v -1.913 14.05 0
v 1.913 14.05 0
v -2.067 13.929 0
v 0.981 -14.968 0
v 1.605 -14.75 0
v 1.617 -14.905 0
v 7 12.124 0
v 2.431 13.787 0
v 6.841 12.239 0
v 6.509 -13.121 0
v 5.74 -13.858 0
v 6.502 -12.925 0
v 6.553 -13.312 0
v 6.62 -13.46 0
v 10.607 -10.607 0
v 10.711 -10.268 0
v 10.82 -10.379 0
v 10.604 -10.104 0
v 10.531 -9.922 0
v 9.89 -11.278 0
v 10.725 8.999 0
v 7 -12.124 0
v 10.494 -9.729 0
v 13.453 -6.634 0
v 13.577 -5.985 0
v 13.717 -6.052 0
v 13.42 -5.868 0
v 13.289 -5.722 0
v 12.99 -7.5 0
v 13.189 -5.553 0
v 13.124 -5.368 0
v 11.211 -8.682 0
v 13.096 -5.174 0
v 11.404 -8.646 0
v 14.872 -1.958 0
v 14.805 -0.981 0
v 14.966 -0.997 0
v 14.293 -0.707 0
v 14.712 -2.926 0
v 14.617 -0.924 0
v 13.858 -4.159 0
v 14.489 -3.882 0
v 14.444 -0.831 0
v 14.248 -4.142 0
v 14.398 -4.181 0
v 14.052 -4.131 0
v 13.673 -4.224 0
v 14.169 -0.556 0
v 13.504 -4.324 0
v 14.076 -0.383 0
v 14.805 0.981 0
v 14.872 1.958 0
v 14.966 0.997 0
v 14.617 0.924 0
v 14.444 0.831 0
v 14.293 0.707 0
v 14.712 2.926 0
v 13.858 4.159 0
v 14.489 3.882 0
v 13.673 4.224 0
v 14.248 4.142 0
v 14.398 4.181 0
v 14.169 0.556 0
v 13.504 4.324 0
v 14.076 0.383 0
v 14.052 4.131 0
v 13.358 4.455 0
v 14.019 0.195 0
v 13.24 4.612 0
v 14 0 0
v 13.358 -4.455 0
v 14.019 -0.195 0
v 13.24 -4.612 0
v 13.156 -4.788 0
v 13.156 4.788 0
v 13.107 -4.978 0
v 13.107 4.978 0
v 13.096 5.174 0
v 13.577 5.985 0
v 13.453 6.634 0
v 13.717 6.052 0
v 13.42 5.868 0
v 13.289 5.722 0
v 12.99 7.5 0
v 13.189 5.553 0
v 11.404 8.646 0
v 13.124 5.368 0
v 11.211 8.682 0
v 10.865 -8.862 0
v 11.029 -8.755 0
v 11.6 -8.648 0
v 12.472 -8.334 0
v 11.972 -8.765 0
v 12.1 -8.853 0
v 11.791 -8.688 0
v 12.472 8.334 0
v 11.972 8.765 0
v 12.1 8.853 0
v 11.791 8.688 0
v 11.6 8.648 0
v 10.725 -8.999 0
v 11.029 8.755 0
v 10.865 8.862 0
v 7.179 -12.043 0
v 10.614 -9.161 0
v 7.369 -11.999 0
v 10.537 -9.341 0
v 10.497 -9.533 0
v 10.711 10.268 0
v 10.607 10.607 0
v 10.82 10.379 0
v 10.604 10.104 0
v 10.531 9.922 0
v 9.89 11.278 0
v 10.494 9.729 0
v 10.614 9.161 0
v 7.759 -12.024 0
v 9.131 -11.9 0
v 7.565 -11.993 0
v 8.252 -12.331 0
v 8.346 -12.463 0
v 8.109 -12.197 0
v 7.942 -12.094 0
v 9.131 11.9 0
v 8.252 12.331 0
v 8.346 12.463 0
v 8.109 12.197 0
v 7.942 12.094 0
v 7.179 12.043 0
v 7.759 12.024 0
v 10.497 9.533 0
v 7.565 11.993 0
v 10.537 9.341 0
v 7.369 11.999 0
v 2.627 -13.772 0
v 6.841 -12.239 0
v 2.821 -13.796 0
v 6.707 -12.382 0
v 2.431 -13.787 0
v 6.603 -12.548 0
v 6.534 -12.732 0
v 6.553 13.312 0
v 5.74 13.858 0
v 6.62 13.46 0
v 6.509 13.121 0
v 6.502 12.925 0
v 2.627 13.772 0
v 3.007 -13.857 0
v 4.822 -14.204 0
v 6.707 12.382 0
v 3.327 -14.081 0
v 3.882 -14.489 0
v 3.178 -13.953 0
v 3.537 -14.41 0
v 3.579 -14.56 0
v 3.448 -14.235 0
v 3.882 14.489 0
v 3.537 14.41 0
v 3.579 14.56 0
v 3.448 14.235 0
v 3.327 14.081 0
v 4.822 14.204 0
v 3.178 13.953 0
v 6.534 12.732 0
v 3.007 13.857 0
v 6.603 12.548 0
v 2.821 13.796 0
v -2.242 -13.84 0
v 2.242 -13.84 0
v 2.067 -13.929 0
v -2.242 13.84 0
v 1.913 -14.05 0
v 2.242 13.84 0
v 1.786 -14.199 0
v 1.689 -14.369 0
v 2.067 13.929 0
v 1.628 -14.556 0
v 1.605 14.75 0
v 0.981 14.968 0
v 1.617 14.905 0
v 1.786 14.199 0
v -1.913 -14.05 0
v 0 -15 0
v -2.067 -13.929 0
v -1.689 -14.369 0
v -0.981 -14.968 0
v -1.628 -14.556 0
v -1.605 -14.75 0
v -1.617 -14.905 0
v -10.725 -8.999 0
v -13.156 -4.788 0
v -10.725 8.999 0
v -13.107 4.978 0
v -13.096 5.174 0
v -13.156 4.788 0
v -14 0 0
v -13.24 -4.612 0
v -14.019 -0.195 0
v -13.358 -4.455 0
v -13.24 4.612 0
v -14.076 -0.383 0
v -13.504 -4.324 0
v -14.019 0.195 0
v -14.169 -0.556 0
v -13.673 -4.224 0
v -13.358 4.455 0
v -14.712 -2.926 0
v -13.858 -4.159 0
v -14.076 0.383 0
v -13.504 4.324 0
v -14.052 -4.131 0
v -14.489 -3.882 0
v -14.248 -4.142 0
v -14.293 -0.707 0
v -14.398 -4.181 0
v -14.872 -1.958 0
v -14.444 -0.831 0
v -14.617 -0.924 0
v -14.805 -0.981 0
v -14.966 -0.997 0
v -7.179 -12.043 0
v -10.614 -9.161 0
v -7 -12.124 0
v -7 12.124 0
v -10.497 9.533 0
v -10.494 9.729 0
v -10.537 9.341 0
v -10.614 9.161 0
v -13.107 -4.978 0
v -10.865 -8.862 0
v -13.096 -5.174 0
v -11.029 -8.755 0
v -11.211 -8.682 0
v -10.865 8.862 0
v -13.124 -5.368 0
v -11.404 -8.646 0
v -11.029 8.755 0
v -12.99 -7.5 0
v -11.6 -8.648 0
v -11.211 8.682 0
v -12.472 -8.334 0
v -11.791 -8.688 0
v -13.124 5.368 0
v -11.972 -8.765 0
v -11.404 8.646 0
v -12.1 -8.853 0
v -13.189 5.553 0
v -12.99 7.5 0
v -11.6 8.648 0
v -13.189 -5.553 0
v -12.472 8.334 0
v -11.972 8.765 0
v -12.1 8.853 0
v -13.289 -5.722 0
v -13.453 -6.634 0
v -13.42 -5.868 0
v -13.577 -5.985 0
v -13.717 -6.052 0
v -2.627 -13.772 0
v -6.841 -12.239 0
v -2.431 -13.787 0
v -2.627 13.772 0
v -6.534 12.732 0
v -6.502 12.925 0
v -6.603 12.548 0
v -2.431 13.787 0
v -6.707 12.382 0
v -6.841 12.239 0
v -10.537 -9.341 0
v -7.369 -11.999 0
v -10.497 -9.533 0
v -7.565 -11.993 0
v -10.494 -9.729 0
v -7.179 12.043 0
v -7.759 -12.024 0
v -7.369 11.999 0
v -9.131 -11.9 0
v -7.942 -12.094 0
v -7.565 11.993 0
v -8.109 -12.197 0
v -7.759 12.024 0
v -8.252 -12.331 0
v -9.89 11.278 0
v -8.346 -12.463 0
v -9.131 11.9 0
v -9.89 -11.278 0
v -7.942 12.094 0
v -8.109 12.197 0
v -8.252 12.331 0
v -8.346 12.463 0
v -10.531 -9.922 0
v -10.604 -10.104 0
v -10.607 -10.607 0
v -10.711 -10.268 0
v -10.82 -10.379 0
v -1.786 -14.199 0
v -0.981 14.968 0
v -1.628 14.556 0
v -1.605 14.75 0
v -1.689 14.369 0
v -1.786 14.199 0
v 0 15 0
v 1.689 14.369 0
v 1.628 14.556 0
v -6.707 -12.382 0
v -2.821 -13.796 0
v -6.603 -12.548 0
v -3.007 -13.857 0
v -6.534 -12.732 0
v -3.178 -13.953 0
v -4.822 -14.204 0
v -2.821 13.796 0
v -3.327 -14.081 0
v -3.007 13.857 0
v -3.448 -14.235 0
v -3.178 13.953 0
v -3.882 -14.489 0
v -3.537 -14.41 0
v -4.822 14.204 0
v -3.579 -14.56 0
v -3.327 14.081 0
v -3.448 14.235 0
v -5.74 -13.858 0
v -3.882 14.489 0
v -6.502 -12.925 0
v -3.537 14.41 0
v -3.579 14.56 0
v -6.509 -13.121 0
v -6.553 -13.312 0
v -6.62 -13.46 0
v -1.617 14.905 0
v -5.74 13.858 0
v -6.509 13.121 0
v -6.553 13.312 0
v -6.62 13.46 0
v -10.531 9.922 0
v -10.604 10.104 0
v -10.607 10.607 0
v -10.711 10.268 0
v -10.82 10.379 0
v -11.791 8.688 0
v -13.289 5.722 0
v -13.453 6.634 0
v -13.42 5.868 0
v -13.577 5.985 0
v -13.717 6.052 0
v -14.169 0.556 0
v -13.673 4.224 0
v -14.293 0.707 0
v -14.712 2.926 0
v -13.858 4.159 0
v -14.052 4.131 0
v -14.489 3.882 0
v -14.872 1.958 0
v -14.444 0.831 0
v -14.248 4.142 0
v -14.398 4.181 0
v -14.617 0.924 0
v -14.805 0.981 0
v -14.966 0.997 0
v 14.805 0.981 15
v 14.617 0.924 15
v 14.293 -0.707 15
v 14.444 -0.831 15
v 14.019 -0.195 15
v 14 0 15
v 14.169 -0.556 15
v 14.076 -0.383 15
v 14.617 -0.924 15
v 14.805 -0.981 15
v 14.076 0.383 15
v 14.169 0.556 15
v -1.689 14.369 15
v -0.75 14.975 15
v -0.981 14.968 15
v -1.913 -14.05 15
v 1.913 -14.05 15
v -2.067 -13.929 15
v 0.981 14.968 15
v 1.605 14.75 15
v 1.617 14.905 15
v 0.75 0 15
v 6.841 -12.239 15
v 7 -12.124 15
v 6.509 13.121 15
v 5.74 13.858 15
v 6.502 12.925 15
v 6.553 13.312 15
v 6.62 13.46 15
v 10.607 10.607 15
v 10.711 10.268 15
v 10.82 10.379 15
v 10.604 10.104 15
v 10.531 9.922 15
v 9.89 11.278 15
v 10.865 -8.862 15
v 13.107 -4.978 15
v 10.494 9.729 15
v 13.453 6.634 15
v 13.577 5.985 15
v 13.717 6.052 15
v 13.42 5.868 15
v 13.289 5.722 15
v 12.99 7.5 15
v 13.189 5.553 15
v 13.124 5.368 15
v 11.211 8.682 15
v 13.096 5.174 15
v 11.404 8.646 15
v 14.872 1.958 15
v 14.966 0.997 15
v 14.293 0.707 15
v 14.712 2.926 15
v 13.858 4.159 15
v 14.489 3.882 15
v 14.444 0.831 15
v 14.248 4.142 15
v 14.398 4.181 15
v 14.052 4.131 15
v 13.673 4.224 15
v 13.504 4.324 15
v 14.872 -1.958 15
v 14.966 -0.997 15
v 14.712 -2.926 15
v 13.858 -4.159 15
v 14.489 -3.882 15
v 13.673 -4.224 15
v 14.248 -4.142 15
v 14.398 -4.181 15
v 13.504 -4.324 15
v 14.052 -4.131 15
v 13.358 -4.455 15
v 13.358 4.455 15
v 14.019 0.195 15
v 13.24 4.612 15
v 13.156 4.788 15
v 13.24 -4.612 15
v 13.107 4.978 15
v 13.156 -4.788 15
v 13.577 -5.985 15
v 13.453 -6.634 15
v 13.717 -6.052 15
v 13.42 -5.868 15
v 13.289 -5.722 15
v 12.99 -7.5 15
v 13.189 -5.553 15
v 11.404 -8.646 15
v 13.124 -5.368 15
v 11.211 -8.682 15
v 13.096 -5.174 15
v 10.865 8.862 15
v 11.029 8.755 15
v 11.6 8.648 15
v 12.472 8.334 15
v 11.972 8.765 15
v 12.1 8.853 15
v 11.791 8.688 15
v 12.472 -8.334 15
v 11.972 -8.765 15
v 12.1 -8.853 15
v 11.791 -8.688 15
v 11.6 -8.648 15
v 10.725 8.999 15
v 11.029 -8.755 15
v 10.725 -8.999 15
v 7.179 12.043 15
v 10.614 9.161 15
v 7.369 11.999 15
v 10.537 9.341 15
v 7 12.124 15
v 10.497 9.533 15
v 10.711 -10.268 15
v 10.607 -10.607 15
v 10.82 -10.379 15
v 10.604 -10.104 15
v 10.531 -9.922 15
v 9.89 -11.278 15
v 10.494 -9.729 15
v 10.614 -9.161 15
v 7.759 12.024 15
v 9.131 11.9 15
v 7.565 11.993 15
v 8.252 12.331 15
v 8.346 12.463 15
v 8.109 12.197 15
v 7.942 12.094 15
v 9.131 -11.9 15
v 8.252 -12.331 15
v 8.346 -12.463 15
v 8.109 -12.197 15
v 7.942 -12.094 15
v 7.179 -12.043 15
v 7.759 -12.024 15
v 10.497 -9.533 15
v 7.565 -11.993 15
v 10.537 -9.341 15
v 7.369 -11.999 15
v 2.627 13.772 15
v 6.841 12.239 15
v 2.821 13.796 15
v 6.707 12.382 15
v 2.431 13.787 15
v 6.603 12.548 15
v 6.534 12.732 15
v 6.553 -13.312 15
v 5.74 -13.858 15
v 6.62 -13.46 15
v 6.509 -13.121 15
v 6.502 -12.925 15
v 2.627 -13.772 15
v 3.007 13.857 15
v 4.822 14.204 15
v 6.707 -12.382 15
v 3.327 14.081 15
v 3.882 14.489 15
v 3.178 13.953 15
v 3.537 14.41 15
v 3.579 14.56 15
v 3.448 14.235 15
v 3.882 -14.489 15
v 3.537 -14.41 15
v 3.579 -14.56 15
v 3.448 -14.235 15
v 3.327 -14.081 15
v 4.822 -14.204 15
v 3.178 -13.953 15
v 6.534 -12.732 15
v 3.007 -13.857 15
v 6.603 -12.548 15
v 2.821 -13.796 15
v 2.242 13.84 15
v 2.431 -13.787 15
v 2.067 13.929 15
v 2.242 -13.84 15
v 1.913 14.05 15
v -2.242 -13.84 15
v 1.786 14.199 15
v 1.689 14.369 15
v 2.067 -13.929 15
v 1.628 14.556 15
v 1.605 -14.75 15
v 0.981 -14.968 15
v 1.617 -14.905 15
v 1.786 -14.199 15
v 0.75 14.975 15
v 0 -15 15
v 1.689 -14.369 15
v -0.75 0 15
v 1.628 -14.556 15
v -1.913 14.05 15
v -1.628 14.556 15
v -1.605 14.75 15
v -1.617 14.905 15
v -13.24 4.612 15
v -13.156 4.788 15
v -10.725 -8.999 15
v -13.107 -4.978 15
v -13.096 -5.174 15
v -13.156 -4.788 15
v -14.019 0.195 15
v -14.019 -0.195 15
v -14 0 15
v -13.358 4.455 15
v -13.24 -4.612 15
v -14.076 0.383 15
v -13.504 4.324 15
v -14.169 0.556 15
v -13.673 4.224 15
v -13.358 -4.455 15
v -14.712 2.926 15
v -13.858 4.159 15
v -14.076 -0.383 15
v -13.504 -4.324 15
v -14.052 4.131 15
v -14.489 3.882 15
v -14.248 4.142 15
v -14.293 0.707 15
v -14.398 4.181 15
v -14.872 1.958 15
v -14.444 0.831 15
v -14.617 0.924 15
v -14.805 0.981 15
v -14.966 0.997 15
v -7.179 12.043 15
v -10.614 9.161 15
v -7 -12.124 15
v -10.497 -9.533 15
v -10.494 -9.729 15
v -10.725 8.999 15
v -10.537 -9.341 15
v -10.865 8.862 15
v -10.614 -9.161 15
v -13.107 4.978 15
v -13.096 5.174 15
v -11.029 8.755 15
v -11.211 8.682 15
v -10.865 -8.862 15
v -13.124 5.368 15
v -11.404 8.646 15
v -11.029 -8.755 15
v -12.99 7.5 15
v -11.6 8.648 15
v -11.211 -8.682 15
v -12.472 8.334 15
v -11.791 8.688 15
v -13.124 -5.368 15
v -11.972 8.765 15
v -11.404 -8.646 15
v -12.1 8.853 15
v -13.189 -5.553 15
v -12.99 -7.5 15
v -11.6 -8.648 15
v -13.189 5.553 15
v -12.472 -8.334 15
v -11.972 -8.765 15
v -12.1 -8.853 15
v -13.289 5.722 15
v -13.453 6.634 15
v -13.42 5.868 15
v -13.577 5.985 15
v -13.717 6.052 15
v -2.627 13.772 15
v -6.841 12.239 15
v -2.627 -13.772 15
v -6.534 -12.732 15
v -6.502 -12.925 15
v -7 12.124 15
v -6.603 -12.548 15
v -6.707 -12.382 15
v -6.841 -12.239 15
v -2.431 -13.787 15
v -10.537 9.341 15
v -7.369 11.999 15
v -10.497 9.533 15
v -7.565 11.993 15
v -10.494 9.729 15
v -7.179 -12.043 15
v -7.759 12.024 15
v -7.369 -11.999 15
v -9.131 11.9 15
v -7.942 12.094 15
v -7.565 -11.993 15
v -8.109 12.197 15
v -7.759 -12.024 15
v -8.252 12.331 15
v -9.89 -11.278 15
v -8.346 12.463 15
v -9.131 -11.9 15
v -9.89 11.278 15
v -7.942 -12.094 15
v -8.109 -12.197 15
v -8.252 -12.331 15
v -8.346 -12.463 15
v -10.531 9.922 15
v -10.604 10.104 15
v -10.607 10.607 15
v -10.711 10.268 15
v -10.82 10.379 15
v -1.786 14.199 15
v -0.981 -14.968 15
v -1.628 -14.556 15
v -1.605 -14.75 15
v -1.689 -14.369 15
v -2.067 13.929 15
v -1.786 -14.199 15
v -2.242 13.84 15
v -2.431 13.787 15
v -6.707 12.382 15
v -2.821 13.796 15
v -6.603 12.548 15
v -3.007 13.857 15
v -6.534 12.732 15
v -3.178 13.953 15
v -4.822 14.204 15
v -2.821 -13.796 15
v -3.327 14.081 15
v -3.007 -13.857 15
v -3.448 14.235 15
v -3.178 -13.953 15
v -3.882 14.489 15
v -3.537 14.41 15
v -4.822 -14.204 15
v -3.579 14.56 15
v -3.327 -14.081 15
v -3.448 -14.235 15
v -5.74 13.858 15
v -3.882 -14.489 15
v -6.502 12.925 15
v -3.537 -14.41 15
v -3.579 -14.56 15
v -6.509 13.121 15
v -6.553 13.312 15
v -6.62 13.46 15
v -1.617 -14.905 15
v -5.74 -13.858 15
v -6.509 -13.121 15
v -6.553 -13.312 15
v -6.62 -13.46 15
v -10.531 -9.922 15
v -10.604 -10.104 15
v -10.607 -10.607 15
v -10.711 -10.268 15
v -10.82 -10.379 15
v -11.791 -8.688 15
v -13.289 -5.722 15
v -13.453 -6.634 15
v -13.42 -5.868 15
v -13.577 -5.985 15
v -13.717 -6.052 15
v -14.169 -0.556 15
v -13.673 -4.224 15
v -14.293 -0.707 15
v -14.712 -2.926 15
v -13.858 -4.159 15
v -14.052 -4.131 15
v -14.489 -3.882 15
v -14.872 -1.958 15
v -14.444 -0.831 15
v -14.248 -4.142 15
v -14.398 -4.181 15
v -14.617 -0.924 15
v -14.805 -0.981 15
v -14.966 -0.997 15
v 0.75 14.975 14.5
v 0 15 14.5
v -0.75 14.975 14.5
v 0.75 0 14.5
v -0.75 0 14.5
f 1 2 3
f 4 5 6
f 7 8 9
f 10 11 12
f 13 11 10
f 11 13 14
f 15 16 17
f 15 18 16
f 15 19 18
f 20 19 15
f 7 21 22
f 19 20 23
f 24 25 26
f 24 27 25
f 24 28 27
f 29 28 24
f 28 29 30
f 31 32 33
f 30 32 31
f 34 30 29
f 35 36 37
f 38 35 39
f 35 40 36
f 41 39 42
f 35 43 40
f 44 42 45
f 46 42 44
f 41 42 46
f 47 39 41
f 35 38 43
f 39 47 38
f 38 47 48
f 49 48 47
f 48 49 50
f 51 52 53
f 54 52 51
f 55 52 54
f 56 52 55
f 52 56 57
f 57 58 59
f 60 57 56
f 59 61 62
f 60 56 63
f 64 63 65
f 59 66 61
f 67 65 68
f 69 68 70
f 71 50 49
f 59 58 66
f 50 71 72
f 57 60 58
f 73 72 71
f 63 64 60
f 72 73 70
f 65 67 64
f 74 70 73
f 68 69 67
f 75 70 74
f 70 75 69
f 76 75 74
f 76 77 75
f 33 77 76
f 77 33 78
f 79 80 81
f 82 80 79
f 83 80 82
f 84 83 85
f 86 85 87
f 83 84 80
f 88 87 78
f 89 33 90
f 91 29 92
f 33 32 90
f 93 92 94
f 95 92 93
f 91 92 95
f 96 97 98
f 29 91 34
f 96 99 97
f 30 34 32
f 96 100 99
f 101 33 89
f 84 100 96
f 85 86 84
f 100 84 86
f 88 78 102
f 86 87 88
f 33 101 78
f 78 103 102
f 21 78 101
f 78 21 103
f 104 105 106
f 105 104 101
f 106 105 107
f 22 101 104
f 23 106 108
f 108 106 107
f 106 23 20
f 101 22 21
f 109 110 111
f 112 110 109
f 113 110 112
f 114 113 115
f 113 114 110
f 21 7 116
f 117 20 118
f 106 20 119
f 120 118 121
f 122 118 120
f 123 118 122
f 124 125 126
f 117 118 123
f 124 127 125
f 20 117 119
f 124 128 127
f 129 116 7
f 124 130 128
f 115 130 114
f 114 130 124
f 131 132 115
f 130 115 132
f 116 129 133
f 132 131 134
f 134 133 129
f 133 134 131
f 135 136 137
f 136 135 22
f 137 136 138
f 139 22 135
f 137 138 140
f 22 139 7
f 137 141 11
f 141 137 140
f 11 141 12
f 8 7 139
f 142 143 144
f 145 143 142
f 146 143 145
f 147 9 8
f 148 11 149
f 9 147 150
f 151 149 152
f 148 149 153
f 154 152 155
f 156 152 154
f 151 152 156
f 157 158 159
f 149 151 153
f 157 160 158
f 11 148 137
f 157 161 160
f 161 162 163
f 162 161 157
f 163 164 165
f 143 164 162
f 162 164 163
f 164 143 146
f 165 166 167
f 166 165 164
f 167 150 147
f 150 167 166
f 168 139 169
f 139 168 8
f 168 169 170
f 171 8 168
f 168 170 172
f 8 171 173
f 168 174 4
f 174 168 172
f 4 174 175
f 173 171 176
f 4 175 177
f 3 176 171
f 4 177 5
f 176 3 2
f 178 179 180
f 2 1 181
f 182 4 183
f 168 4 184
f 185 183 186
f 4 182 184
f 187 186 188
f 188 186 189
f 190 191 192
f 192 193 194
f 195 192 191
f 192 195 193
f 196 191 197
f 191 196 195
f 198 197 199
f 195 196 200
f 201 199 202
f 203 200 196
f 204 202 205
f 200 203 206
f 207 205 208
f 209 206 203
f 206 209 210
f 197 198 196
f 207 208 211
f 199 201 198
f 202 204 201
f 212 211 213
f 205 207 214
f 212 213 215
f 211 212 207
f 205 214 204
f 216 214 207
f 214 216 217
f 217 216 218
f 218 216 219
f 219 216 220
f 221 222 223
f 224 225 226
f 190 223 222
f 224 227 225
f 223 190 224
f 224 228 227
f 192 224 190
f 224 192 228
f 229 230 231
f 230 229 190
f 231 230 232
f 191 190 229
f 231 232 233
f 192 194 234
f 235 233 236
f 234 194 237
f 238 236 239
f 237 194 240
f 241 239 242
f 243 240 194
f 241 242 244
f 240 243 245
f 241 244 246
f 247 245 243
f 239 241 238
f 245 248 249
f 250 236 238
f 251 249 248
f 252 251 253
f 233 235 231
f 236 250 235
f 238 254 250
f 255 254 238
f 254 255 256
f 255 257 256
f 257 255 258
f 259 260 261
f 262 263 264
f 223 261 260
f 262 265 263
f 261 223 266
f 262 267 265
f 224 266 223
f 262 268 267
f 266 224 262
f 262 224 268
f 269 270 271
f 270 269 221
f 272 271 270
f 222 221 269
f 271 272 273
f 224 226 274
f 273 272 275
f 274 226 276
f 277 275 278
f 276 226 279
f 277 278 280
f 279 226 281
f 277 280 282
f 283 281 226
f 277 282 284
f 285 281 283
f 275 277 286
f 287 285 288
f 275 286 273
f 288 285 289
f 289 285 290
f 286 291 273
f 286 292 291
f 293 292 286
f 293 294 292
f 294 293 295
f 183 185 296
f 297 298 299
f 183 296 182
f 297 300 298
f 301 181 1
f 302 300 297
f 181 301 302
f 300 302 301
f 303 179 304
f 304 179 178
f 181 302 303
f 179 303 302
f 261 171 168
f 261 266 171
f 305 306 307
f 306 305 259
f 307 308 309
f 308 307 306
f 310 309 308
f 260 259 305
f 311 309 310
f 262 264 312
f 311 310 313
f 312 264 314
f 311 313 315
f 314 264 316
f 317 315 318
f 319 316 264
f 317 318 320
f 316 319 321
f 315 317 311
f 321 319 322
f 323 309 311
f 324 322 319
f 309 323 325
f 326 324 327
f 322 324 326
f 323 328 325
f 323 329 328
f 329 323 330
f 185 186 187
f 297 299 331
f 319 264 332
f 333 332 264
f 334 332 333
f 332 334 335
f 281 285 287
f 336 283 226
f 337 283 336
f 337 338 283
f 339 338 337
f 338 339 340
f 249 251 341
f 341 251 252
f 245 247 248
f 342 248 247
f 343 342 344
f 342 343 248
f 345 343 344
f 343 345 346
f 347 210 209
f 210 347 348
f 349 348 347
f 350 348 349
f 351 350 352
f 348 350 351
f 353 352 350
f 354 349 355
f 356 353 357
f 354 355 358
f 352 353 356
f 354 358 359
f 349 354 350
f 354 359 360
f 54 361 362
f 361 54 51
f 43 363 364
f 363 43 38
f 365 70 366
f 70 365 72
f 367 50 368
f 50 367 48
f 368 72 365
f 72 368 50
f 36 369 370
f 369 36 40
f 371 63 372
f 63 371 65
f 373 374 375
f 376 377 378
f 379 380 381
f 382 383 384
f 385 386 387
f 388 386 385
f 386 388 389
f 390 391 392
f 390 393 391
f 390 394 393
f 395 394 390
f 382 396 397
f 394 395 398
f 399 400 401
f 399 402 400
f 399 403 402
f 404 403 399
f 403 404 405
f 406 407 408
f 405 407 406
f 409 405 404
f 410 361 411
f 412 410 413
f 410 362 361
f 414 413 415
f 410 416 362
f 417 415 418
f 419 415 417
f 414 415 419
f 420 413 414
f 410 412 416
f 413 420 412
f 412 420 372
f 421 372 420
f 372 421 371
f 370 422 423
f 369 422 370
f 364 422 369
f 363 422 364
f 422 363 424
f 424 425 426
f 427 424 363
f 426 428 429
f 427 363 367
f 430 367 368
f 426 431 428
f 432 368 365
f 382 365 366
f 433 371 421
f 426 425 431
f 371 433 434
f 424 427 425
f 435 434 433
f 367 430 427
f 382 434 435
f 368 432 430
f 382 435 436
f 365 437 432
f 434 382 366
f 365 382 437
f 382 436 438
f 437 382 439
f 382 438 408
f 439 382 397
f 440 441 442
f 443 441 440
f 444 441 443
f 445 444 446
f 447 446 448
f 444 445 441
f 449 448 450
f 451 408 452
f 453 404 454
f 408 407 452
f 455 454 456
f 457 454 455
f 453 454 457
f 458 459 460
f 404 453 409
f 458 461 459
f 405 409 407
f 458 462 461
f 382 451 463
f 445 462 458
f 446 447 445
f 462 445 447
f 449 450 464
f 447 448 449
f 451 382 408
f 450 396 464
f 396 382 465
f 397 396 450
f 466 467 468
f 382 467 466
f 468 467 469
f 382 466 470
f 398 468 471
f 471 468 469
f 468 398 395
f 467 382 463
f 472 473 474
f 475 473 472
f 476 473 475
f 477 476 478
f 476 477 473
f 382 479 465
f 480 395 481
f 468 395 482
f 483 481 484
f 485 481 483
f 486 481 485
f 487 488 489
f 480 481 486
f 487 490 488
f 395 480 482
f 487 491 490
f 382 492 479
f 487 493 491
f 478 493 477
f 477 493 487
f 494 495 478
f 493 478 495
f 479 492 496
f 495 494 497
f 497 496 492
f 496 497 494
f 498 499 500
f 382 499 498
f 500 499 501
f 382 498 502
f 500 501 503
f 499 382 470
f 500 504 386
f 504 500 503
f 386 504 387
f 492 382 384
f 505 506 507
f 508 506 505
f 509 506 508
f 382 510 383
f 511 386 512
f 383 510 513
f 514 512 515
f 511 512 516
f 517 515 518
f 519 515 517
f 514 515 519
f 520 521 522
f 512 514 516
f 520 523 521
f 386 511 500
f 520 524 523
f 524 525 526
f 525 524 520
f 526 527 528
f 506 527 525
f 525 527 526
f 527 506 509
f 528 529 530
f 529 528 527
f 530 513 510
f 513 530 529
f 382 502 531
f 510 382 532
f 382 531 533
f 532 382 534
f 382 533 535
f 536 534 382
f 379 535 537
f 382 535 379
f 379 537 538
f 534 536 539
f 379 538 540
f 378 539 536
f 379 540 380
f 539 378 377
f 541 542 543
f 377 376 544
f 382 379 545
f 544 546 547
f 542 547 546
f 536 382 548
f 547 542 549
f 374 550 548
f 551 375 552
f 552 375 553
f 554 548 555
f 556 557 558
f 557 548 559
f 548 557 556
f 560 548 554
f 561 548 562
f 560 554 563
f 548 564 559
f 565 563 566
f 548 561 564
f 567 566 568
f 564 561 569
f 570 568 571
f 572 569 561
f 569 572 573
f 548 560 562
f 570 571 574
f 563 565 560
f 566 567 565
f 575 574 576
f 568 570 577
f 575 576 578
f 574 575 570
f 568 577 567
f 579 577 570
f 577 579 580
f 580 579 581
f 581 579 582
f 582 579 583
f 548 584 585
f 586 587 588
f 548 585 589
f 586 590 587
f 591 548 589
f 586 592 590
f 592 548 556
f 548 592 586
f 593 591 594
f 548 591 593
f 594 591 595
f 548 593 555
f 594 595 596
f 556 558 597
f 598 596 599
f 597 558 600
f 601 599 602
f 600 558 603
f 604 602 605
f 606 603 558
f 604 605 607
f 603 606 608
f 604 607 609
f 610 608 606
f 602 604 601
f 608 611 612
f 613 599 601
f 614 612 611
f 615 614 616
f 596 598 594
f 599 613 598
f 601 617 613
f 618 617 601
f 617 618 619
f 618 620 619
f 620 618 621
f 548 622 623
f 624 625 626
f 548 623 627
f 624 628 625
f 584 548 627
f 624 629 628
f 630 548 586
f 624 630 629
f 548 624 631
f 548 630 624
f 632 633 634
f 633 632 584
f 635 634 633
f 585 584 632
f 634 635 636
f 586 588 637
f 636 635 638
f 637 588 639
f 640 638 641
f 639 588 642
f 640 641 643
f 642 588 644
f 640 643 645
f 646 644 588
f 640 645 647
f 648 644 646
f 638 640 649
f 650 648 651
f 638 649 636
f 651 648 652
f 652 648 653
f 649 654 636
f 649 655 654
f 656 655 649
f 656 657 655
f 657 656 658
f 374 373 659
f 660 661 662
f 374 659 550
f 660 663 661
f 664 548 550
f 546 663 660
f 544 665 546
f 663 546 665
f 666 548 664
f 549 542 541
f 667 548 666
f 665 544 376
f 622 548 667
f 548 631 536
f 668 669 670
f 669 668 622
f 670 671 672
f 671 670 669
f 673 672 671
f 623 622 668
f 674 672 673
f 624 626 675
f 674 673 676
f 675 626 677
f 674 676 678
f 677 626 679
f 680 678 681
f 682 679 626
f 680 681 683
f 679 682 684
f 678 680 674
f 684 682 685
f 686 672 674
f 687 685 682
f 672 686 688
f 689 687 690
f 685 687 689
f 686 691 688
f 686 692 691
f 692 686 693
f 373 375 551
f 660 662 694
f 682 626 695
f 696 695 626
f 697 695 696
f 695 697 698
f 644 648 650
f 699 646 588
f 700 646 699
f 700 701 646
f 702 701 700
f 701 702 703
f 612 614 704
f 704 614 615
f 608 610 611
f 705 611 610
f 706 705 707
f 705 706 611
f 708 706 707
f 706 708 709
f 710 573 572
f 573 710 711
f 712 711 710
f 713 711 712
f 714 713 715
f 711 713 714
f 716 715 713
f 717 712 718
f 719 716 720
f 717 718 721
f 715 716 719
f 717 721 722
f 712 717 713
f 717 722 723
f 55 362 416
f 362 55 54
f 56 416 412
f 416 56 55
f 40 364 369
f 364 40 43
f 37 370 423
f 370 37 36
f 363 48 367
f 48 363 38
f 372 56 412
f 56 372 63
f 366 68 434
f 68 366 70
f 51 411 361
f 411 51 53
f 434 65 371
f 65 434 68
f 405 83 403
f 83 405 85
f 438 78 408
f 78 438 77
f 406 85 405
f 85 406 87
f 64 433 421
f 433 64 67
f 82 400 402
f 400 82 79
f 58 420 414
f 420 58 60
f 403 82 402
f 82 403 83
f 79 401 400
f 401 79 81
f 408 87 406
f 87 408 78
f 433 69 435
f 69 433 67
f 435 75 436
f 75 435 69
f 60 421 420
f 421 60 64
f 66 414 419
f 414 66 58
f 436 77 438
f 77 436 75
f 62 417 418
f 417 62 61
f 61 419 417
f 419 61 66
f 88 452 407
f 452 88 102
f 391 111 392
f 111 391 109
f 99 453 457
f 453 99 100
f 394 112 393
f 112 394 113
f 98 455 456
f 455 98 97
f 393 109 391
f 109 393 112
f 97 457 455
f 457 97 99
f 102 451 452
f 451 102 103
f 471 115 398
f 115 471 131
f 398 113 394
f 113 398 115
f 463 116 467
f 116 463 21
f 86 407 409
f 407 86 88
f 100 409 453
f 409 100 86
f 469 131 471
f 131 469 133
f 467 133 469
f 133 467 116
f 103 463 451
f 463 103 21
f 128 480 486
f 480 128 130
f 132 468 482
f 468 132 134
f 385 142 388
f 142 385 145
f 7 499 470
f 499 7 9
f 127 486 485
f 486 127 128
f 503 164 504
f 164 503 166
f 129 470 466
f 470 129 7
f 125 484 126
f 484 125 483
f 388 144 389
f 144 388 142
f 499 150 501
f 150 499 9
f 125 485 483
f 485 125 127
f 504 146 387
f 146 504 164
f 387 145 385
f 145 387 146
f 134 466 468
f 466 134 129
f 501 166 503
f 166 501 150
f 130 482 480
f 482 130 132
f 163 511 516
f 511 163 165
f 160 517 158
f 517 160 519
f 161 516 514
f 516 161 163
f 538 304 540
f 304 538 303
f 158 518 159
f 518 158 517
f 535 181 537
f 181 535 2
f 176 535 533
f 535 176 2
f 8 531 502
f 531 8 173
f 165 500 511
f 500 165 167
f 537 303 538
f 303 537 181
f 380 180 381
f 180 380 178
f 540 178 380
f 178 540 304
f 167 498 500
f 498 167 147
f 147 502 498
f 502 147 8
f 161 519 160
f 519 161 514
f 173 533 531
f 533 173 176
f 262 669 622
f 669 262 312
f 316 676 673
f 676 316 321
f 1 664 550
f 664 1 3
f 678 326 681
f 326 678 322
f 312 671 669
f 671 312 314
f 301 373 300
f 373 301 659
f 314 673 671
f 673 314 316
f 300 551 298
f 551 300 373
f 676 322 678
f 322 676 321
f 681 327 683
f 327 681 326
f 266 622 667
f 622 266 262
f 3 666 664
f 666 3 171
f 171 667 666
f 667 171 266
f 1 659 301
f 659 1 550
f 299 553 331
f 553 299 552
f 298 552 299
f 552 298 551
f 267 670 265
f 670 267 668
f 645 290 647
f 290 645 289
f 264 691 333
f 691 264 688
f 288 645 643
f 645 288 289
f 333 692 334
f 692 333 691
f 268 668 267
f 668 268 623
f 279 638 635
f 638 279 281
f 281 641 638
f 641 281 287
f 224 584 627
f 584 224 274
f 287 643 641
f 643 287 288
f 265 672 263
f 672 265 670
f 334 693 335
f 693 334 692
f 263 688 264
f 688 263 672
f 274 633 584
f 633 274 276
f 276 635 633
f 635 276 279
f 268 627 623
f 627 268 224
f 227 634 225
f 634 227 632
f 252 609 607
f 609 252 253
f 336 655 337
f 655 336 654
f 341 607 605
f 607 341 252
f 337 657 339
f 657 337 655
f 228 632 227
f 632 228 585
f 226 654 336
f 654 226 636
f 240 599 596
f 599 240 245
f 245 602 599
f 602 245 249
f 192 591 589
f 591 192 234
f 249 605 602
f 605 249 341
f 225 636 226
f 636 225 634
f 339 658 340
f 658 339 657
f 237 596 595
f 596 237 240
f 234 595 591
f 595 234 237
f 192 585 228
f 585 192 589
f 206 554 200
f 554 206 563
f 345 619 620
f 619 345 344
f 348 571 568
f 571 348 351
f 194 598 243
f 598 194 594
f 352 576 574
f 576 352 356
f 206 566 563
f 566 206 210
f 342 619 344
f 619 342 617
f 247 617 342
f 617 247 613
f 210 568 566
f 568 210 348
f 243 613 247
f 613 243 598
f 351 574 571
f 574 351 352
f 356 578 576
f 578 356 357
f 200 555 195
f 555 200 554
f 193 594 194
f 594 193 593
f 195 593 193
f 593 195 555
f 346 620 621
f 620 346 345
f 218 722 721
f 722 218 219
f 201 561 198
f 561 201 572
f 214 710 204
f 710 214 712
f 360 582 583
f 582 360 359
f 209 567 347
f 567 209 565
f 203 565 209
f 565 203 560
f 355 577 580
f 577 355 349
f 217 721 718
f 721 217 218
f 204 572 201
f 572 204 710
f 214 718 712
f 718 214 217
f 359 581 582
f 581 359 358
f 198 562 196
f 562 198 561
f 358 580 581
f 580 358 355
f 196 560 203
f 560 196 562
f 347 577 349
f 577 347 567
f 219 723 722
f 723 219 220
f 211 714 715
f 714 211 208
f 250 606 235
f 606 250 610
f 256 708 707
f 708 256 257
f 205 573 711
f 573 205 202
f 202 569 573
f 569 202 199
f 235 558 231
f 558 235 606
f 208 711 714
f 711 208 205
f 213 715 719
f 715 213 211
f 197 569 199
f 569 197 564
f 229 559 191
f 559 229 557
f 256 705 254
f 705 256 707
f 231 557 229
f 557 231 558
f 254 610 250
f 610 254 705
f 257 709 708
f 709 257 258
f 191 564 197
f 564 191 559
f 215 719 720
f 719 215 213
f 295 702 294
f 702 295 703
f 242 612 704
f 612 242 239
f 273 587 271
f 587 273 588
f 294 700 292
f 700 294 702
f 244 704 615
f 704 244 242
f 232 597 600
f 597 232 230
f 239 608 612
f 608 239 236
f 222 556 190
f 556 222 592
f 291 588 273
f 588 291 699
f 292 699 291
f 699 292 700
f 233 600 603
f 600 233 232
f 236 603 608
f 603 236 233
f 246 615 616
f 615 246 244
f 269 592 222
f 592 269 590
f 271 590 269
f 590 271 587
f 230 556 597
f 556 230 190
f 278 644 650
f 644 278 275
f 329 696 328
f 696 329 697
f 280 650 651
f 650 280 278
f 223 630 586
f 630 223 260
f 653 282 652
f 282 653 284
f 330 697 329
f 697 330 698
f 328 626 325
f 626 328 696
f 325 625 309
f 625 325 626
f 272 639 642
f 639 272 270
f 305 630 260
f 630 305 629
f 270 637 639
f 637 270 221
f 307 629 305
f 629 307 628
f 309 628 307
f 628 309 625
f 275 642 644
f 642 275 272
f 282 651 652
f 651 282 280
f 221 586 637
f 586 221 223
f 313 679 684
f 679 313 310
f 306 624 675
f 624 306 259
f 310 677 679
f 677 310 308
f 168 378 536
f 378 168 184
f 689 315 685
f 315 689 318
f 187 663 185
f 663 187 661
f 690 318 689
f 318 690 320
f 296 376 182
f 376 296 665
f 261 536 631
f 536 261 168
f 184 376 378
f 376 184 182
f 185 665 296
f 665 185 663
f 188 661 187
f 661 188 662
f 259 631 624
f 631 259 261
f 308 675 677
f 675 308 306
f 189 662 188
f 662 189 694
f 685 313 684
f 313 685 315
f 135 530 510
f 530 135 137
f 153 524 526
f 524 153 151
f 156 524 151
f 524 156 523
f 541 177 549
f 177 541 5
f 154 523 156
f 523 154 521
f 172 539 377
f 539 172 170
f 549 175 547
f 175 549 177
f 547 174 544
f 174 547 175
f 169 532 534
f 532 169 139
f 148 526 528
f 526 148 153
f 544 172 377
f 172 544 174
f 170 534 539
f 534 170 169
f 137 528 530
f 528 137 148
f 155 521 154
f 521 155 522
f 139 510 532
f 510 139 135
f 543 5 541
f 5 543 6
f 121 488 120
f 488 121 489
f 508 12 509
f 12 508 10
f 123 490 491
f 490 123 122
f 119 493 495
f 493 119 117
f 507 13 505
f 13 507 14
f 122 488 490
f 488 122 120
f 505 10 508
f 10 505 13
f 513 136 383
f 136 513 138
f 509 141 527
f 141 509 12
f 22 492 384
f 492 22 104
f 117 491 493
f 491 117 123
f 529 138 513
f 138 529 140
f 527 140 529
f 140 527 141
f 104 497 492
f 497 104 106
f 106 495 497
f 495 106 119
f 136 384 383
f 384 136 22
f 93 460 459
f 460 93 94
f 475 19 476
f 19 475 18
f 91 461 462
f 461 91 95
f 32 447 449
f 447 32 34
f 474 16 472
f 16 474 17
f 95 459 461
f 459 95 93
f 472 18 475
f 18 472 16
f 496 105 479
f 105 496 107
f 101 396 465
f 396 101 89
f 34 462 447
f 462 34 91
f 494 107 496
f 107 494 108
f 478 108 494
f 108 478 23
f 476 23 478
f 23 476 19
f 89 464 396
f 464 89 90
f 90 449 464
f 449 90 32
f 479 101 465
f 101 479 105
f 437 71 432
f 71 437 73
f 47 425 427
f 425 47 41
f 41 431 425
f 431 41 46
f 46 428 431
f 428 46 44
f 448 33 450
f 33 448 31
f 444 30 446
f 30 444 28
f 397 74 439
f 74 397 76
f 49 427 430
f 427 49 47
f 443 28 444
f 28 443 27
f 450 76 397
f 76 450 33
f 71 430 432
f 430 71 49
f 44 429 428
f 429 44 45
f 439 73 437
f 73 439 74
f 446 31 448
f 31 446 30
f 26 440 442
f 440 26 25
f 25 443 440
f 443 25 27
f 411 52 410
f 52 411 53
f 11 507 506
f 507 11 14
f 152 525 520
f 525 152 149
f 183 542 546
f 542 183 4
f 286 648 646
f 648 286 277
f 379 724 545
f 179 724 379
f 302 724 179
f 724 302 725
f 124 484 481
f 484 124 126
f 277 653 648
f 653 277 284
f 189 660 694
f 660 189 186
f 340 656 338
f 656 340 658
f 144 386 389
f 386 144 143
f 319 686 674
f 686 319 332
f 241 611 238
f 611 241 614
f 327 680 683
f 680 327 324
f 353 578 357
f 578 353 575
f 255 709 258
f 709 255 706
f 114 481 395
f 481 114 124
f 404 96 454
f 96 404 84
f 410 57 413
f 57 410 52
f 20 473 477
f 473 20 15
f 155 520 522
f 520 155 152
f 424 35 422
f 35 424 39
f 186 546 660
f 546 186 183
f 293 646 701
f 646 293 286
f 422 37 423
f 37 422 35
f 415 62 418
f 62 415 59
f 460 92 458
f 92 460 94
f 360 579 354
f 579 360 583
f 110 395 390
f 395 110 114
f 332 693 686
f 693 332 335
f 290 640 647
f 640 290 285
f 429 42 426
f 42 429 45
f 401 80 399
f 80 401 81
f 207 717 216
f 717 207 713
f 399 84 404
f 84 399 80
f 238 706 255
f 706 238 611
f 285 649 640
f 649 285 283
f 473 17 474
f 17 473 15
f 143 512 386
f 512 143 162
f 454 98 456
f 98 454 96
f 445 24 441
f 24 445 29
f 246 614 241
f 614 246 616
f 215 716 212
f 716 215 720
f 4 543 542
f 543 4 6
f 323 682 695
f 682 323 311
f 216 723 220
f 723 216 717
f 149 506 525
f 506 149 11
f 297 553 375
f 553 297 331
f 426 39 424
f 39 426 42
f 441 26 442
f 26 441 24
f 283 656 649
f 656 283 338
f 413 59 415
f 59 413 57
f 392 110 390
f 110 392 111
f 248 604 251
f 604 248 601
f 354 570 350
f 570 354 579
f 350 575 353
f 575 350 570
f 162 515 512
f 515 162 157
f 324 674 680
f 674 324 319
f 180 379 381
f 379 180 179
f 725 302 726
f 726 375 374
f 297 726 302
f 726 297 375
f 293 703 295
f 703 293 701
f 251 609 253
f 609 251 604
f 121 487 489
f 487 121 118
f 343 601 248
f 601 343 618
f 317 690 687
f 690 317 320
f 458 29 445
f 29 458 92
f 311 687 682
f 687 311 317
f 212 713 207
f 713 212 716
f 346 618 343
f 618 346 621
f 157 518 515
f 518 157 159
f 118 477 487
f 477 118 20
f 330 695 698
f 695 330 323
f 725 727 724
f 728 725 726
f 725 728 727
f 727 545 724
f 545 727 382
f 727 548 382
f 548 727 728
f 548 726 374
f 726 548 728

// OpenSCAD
// Replacement knob for a hotplate stirrer with a 6 mm D-shaft
// Print orientation: the side that faces the hotplate is down on the bed (z = 0)

// ---------------- Parameters ----------------
knob_d        = 30;    // knob outer diameter (mm)
knob_h        = 15;    // knob height (mm)

shaft_d       = 6.2;   // D-bore diameter (mm)
shaft_flat    = 4.7;   // distance from the flat of the D to the opposite side (mm)

groove_count  = 18;    // number of vertical grip grooves (mm)
groove_d      = 2;     // groove diameter (mm)

pointer_w     = 1.5;   // pointer groove width (mm)
pointer_d     = 1;     // pointer groove depth (mm)

eps           = 0.5;   // overcut for clean differences (mm)

$fn = 96;              // resolution for curved shapes

// ---------------- Derived ----------------
shaft_r = shaft_d / 2;
// chord length of the D cut at depth eps, keeping the flat horizontal
chord   = sqrt(shaft_d * eps - eps * eps);

// ---------------- Model ----------------
difference() {
    // Main body
    cylinder(d = knob_d, h = knob_h);

    // D-shaped blind bore from the bottom face
    translate([0, 0, -eps])
        linear_extrude(height = knob_h + 2 * eps)
            union() {
                translate([0, 0, 0])
                    cylinder(d = shaft_d, h = knob_h);
                translate([-shaft_r, 0, 0])
                    translate([0, 0, -eps])
                        cube([chord, 2 * eps, knob_h + 2 * eps]);
            }

    // Vertical grip grooves, evenly spaced, centred on the outer surface
    for (i = [0 : groove_count - 1])
        rotate([0, 0, i * 360 / groove_count])
            translate([knob_d / 2, 0, 0])
                cylinder(d = groove_d, h = knob_h, $fn = 32);

    // Pointer groove on the top face, on the same side as the flat of the D
    translate([0, 0, knob_h - eps])
        linear_extrude(height = eps + pointer_d)
            polygon([
                [0, 0],
                [pointer_w / 2, 0],
                [pointer_w / 2, knob_d / 2],
                [-pointer_w / 2, knob_d / 2],
                [-pointer_w / 2, 0]
            ]);
}
